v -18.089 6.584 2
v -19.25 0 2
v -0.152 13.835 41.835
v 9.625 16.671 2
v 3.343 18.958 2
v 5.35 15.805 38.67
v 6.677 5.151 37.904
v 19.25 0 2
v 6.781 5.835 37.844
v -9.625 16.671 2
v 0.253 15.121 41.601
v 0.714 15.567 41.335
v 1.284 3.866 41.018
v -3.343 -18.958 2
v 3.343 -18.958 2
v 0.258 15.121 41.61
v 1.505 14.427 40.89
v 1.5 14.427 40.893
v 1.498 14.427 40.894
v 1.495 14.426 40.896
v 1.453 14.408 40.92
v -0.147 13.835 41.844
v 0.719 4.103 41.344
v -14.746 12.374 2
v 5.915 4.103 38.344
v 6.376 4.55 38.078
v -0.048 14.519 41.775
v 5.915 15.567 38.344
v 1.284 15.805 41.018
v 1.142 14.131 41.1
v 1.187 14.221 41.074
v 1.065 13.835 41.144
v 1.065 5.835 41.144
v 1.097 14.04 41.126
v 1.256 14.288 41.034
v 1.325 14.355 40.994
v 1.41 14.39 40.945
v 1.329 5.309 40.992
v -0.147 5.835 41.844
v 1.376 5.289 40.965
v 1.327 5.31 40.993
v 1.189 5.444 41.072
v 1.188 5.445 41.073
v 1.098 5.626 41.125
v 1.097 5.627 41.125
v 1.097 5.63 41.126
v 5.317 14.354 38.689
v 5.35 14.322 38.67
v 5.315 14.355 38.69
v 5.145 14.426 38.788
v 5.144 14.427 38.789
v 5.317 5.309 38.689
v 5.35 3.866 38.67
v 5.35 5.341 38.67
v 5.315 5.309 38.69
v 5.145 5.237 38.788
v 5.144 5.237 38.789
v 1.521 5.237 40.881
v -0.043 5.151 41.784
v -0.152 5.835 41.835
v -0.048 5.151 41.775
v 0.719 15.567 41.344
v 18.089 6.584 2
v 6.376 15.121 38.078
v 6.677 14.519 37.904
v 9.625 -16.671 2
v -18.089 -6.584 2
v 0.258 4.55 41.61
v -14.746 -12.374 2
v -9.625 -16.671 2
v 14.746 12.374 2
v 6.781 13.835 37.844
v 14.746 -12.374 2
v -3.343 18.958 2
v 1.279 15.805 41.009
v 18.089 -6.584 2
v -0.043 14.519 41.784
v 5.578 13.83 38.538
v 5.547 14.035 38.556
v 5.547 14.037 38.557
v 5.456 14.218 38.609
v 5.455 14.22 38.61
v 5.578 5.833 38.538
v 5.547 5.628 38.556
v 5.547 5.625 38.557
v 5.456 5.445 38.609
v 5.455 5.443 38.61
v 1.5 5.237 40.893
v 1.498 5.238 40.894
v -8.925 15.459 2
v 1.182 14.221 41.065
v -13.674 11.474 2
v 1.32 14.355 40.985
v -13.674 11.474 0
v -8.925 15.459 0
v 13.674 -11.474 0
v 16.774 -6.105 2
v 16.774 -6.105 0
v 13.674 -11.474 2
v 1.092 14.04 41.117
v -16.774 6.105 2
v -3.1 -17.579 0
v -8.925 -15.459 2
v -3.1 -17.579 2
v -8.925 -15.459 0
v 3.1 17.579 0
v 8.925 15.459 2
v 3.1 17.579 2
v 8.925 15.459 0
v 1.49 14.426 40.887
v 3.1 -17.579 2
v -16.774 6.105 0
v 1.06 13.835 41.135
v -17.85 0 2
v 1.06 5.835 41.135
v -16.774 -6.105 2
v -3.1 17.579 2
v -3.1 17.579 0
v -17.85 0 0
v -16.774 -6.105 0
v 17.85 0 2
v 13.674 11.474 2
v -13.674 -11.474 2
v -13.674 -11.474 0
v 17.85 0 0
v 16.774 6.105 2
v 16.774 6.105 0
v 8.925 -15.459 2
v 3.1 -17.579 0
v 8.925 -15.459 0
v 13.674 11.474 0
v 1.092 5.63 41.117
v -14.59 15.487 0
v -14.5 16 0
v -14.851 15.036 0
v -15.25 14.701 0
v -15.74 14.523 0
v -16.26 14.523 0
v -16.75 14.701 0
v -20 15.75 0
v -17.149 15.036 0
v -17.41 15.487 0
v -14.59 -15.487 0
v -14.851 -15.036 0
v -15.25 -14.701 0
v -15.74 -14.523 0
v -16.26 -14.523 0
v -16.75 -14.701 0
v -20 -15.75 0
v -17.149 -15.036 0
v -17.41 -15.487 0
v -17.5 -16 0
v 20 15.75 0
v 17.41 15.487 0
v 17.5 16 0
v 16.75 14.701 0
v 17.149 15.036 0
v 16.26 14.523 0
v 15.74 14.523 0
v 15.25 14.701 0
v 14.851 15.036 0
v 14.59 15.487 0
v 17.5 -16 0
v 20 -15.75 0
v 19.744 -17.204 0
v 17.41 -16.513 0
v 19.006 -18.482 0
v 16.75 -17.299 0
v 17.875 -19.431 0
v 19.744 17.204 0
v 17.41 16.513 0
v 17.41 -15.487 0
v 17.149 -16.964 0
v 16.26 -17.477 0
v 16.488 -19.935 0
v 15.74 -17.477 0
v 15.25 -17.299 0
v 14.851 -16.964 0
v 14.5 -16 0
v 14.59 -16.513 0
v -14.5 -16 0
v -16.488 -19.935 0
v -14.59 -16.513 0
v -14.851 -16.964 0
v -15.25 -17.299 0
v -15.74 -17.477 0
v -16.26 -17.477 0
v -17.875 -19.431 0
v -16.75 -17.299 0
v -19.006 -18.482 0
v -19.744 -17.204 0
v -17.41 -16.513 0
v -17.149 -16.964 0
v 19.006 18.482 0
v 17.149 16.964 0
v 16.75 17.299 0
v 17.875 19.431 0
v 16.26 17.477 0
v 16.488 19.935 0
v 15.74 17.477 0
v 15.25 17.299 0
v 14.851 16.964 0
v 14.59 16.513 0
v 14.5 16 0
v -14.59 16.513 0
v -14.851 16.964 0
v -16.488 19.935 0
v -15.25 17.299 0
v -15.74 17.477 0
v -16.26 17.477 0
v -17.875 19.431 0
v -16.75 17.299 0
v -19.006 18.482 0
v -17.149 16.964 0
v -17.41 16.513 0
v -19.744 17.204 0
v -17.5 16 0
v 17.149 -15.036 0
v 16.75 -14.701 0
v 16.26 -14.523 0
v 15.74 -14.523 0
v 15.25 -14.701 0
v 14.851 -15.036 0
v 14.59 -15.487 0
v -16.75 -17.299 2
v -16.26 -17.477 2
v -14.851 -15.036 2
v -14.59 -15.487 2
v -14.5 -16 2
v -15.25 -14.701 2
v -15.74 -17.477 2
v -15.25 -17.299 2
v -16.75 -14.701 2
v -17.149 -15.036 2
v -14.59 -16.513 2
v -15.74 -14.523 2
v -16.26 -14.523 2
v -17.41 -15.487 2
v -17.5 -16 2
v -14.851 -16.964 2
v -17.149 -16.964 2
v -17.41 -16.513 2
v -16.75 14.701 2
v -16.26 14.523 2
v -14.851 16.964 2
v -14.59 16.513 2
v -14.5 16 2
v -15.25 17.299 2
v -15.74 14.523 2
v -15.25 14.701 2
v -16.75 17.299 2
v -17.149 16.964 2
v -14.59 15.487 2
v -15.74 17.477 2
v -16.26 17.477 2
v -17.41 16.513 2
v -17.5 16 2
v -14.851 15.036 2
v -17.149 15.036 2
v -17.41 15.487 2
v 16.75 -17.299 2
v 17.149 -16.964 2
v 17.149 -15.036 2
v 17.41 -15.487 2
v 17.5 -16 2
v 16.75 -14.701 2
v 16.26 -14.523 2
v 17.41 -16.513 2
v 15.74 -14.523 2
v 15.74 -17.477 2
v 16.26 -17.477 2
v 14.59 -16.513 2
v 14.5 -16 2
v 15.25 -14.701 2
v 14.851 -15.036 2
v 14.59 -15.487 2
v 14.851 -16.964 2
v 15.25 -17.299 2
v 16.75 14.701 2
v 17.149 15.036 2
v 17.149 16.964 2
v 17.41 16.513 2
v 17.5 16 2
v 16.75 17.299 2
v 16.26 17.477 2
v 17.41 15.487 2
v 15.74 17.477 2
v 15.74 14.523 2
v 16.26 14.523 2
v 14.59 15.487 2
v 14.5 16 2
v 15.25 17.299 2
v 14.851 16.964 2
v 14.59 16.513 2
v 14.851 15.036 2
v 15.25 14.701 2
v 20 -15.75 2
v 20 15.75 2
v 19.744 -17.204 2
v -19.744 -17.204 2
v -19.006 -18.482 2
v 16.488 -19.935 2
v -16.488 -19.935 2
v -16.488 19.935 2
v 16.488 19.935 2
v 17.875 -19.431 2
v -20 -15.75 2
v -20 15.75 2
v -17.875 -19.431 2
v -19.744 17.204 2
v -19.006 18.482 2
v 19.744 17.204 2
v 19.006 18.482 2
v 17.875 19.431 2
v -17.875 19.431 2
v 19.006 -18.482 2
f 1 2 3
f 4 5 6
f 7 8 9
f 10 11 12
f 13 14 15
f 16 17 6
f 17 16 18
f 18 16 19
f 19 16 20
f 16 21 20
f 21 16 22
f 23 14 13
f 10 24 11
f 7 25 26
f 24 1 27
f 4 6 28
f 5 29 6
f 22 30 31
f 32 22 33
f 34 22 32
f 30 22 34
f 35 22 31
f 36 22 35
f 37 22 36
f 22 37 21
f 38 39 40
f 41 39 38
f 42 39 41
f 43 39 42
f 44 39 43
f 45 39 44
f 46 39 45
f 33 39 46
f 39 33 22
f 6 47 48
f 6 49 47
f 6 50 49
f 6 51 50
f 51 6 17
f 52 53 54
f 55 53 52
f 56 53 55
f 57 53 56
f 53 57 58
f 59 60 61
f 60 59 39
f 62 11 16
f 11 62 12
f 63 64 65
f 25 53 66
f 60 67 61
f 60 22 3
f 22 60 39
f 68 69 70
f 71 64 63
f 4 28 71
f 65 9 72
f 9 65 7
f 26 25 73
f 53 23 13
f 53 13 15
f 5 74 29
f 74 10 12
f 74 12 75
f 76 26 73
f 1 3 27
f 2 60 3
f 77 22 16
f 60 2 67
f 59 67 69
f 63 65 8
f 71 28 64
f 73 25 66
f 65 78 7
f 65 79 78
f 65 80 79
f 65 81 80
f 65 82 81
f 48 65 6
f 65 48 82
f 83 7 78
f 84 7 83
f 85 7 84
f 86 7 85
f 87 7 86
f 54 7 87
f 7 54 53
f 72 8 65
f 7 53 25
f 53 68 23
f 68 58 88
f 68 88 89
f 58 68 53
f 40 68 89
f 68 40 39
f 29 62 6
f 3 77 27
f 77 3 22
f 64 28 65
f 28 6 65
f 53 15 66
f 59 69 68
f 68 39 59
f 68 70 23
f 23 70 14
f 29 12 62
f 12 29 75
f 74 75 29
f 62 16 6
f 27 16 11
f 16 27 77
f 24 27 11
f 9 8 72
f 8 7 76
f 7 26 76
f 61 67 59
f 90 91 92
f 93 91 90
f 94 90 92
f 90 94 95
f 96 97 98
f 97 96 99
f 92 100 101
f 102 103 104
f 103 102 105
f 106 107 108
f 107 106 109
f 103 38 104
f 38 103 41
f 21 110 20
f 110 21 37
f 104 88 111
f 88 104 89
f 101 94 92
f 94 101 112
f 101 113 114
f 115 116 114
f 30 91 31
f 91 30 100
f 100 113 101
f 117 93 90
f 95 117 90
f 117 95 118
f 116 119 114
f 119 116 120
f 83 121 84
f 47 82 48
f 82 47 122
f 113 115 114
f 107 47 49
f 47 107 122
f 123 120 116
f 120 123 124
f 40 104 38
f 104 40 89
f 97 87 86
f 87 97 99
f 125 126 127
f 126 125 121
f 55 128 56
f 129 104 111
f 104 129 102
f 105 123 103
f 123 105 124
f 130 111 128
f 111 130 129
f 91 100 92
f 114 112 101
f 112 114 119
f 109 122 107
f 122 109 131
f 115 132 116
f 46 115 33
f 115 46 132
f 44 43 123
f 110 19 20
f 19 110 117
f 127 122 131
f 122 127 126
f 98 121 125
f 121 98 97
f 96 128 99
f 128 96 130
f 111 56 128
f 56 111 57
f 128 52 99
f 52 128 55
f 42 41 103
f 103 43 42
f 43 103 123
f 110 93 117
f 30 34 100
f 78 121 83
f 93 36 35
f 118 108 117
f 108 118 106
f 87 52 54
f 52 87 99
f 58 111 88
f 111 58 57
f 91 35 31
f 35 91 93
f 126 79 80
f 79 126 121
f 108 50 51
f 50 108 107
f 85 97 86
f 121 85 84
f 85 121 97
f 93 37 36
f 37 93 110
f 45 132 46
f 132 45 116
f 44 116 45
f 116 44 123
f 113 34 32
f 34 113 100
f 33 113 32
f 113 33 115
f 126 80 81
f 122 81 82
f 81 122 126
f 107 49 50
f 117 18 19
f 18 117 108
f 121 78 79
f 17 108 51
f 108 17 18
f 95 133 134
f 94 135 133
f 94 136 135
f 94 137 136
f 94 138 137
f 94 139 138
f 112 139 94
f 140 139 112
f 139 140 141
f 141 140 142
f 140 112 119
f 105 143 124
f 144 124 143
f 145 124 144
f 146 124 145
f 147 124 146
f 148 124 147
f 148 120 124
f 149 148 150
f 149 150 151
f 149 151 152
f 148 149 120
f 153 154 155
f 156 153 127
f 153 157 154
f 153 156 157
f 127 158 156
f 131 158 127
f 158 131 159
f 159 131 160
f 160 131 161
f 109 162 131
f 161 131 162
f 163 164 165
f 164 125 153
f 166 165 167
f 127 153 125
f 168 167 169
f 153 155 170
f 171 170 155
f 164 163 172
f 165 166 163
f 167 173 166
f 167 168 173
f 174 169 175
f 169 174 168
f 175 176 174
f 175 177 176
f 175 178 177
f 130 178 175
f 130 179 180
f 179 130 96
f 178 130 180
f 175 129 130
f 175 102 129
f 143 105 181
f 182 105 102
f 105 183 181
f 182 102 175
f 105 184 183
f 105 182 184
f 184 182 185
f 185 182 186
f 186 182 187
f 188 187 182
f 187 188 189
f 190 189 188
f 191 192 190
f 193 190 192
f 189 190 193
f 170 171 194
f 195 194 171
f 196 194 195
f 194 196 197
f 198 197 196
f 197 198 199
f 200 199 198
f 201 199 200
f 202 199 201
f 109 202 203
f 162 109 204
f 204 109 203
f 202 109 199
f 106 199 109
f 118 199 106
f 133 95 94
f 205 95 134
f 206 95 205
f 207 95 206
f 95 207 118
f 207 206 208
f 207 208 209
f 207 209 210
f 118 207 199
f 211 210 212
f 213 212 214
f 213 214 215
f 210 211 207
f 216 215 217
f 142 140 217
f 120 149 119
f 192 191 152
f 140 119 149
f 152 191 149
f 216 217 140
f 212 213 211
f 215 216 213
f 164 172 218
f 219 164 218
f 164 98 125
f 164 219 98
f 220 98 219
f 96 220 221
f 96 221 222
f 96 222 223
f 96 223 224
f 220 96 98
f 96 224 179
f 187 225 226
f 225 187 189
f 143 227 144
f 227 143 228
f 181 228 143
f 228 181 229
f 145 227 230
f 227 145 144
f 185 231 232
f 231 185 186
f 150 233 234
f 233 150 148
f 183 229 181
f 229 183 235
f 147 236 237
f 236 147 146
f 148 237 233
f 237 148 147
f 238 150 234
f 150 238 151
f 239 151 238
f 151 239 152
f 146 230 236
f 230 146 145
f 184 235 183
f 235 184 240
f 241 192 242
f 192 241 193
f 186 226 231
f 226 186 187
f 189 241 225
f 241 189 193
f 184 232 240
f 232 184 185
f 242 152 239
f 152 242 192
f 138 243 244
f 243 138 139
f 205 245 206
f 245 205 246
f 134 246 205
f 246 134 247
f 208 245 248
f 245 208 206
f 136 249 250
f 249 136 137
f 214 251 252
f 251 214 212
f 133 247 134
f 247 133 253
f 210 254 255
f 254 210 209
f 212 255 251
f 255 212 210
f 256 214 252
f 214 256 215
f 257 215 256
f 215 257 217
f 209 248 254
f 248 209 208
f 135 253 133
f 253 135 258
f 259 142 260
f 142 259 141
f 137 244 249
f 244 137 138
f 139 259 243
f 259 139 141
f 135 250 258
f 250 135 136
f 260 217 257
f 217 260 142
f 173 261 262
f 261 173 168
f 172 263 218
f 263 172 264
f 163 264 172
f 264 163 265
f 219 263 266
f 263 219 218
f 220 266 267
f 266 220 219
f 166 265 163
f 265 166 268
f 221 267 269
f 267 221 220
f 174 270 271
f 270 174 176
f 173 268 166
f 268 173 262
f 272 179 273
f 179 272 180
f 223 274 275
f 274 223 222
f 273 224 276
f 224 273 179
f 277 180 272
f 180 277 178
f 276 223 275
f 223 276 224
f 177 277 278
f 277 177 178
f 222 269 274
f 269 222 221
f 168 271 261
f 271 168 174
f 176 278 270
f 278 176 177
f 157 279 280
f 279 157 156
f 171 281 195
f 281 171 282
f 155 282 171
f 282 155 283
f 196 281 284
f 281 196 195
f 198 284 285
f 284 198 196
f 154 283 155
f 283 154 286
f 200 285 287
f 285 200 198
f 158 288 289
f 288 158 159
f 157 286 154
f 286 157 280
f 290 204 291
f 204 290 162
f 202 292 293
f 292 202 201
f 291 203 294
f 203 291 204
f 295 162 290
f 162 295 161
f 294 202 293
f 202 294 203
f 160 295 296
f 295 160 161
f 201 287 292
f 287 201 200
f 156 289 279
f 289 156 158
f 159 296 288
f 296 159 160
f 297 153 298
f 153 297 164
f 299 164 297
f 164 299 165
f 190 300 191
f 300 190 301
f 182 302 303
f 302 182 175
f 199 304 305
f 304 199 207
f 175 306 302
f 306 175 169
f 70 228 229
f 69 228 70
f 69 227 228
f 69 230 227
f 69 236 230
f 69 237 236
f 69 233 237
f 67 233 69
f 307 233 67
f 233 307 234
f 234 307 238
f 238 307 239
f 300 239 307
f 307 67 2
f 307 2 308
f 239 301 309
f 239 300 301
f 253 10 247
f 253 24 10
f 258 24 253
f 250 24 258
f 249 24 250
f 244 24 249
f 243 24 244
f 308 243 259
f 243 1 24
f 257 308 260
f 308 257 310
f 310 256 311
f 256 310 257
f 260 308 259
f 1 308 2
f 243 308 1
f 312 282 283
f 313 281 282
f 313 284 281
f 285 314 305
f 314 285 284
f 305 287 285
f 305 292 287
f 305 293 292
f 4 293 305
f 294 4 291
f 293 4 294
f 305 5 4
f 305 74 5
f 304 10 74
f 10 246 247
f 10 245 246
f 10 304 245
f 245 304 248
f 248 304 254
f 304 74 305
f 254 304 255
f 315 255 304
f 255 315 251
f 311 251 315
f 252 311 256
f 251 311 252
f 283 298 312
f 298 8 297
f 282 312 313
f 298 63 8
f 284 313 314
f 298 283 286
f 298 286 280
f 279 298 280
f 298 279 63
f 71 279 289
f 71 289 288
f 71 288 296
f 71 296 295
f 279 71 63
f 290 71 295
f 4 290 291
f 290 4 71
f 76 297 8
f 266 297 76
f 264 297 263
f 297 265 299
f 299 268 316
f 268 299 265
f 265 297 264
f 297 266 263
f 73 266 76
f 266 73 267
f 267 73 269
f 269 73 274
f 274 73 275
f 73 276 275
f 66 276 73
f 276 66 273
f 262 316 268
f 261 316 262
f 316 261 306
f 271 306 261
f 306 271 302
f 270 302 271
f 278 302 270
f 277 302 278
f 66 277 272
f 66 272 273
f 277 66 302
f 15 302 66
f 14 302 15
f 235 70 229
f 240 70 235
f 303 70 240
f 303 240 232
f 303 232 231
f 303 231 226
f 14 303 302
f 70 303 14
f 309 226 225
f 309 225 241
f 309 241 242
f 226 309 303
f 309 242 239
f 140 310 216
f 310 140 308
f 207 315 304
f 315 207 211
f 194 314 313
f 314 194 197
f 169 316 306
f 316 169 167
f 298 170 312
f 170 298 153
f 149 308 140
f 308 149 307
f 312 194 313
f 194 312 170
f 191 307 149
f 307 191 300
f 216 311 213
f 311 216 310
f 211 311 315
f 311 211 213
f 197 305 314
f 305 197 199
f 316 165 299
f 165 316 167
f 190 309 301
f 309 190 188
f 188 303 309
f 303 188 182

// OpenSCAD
// Experimental work in progress

$fn = 18;

eps = 0.01;
eps2 = 2*eps;

// Nozzle angle from the fan's normal. Possibe -> down.
nozzle_vertical_angle = 5;
// Nozzle angle from the fan's normal. Possitive -> toward the rear of the machine.
nozzle_horizontal_angle = 15;
nozzle_length = 38;
nozzle_base_od = 38.5;
nozzle_wall_thickness = 1.4;
// Nozzle ip external dimensions
tip_width = 12;
tip_height = 8;
tip_external_corner_radius = 2;
// Positive -> pointing down.
// From parallel to the fan's surface. Positive = clockwise from font view.
tip_vertical_angle = 30;
base_thickness = 2;
base_size = 40;
base_hole_spacing = 32;
base_corner_radius = 4.25;


tip_internal_corner_radius = max(eps, tip_external_corner_radius - nozzle_wall_thickness);

// d1 = inner diameter. d2 = outer diameter.
module donut(d1, d2) {
  rotate_extrude() 
translate([(d1+d2)/2/2, 0, 0]) 
circle(d = (d2-d1)/2);
}

// Centered at x,y=0.
module rounded_cube(x_len, y_len, h, r) {
  xr = x_len/2;
  yr = y_len/2;
  hull() {
    translate([-(xr-r), -(yr-r), 0]) cylinder(r=r, h=h);
    translate([-(xr-r), (yr-r), 0]) cylinder(r=r, h=h);
    translate([(xr-r), -(yr-r), 0]) cylinder(r=r, h=h);
    translate([(xr-r), , (yr-r)]) cylinder(r=r, h=h);
  } 
}

module nozzle() {
  //translate([nozzle_base_od/2 , nozzle_base_od/2, 0])
  h = nozzle_length * cos(nozzle_vertical_angle);
  x = nozzle_length * sin(nozzle_vertical_angle);
  y = nozzle_length * sin(nozzle_horizontal_angle);
  w2 = nozzle_wall_thickness * 2;
  
  echo("Nozzle height", h);
  difference() {
    hull() {
      cylinder(d=nozzle_base_od, h=eps);
      translate([x, y, h-eps]) rotate([0, tip_vertical_angle, 0]) rounded_cube(tip_height, tip_width, eps, tip_external_corner_radius);
    }
    hull() {
      translate([0, 0, -eps]) cylinder(d=nozzle_base_od - w2, h=eps2);
      translate([x, y, h-eps]) rotate([0, tip_vertical_angle, 0]) rounded_cube(tip_height-w2, tip_width-w2, eps2, tip_internal_corner_radius);
   //   translate([0, 0, -eps]) cylinder(d=nozzle_base_od-2*nozzle_wall_thickness, h=eps);
   //   translate([40+nozzle_wall_thickness, 0+nozzle_wall_thickness, 50]) rounded_cube(7-2*nozzle_wall_thickness, 10-2*nozzle_wall_thickness, eps, 0.5);
    }
  }
 // rounded_cube(fan_diameter +2*5, fan_diameter + 2*5, 2+eps, 2);

}

module base() {
  h = base_thickness+eps2;
  l = base_hole_spacing/2;
  difference() {
    rounded_cube(base_size, base_size, base_thickness, base_corner_radius);
    translate(0, 0, -eps) union() {
      cylinder(d=nozzle_base_od-2*nozzle_wall_thickness, h=h);
      translate([-l, -l, 0]) cylinder(d=3, h=h);
      translate([-l, l, 0]) cylinder(d=3, h=h);
      translate([l, -l, 0]) cylinder(d=3, h=h);
      translate([l, l, 0]) cylinder(d=3, h=h);
    }
  }
}

module main() {
  difference() {
    union() {
      translate([0, 0, base_thickness - eps]) nozzle(); 
      base();
    }
      // translate([-100 - 6, -50, -eps])  cube([100, 100, 100]);

  }
  

  //rounded_cube(nozzle_base_od +2*5, nozzle_base_od + 2*5, 2+eps, 2);

}




//circle(d = (10)/2);



main();

//main();

//nozzle();

//base();

// translate([x, 0, h-eps]) rounded_cube(7, 10, eps, 1);

//rounded_cube(7, 10, eps, 1);

   // rounded_cube([40, 40, eps, 3]);


//rounded_cube(6, 10, 5, 1);
